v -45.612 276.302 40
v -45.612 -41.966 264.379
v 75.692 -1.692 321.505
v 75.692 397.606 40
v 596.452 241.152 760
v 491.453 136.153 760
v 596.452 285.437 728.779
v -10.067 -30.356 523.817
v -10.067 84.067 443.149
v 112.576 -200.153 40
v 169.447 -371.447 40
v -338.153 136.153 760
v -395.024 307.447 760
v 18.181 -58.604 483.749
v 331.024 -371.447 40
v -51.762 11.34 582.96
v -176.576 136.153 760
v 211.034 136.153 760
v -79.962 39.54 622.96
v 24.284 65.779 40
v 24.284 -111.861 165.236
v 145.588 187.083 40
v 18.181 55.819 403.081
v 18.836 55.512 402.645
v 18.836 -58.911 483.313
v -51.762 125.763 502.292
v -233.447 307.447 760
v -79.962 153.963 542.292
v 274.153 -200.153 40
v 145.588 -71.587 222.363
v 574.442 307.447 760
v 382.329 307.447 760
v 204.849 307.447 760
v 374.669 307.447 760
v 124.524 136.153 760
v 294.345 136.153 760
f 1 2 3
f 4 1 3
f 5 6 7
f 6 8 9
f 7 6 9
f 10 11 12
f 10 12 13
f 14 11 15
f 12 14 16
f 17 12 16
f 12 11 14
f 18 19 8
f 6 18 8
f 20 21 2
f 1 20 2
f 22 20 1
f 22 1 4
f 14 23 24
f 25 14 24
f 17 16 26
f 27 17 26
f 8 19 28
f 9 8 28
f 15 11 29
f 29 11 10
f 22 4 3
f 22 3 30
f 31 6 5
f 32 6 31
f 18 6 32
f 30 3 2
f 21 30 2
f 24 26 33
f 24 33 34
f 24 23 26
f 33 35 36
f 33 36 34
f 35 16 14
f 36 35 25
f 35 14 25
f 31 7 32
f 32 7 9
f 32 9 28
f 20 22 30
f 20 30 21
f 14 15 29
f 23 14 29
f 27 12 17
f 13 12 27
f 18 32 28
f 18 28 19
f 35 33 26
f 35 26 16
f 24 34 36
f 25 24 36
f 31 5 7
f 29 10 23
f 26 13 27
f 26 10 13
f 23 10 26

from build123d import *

# Parameters (mm, degrees)
F9_W           = 140
F9_H           = 140
F10_DEPTH      = 800
F10_DEPTH_BACK = 800
F12_W          = 564.5952224731
F12_H          = 285.0261449814
F13_DEPTH      = 1428.1339100058
F15_DEPTH      = 700
F16_W          = 560.895
F16_H          = 273.263
F17_DEPTH      = 1359.2254278392
F19_DEPTH      = 700
F21_DEPTH      = 1596.4534700886
F22_W          = 800
F22_H          = 96.37819767
F22_W_2        = 981.2902510166
F22_H_2        = 103.05424124
F23_DEPTH      = 1596.4534700886
F27_W          = 131.7142857143
F27_H          = 140
F28_DEPTH      = 25
F28_DEPTH_BACK = 50
F29_DEPTH      = 800
F31_DEPTH      = 1596.4534700886


with BuildPart() as f10:
    # F9 (on offset) → F10 (new body, two sides)
    with BuildSketch(Plane(origin=(-141.3425141685, 141.3425141685, 200.4858357), x_dir=(0.8664559823, 0.2876707367, 0.4080435981), z_dir=(-0.4992534734, 0.4992534734, 0.7081609552))) as f10_sk:
        with Locations((126.285384252, -256.6345486516)):
            Rectangle(F9_W, F9_H)
    extrude(amount=F10_DEPTH)
    extrude(f10_sk.sketch, amount=-F10_DEPTH_BACK)

    # F12 (on offset) → F13 (cut, through all)
    with BuildSketch(Plane.YZ.offset(-1000)):
        with Locations((282.2976112366, 942.5130724907)):
            Rectangle(F12_W, F12_H)
        Polygon((-127.9739290476, -303.6372065544), (-127.9739290476, 0), (-400, 0), (-567.8840875626, 0), (-567.8840875626, -303.6372065544), align=None)
    extrude(amount=F13_DEPTH, mode=Mode.SUBTRACT)


with BuildPart() as f15:
    # F14 (on face) → F15 (new body)
    with BuildSketch(Plane(origin=(0, -152.5378125987, 107.5391578821), x_dir=(-1, 0, 0), z_dir=(0, 0.8173074798, -0.5762017732))):
        Polygon((45.6116016434, 191.898172882), (-75.6922358782, 261.7936591636), (-145.5877221597, 140.4898216419), (-24.2838846381, 70.5943353604), align=None)
    extrude(amount=F15_DEPTH)

    # F16 (on offset) → F17 (cut, through all)
    with BuildSketch(Plane.YZ.offset(-1000)):
        with Locations((375.4791935778, -136.6315)):
            Rectangle(F16_W, F16_H)
    extrude(amount=F17_DEPTH, mode=Mode.SUBTRACT)


with BuildPart() as f19:
    # F18 (on face) → F19 (new body)
    with BuildSketch(Plane(origin=(170.0726454226, 56.4655610903, 80.0929944543), x_dir=(-0.2602551811, 0.9577293706, -0.1225630184), z_dir=(0.8664559823, 0.2876707367, 0.4080435981))):
        Polygon((101.8001949413, 524.6782716814), (-17.6730619993, 597.6586860129), (-90.6534763308, 478.1854290723), (28.8197806098, 405.2050147407), align=None)
    extrude(amount=F19_DEPTH)

    # F20 (on offset) → F21 (cut, through all)
    with BuildSketch(Plane.YZ.offset(-1000)):
        Polygon((400, 800), (468.4830904007, 800), (468.4830904007, 1033.912062645), (129.1458308697, 1033.912062645), (129.1458308697, 800), align=None)
    extrude(amount=F21_DEPTH, mode=Mode.SUBTRACT)


with BuildPart() as f23_tool:
    # F22 (on offset) → F23 (new body, through all)
    with BuildSketch(Plane.YZ.offset(-1000)):
        with Locations((0, 808.189098835)):
            Rectangle(F22_W, F22_H)
        with Locations((7.2197765112, -11.52712062)):
            Rectangle(F22_W_2, F22_H_2)
    extrude(amount=F23_DEPTH)


with BuildPart() as f10_1:
    add(f10.part)

    # F23: cut by f23_tool
    add(f23_tool.part, mode=Mode.SUBTRACT)

    # F27 (on 3pt) → F28 (join, two sides)
    with BuildSketch(Plane(origin=(215.8367219303, 152.8155457803, 216.7596394047), x_dir=(0.7756098225, -0.3637058454, -0.5158948161), z_dir=(-0.6312126451, -0.4469077551, -0.6339117093))) as f28_sk:
        with Locations((-279.1603104754, 256.6345486516)):
            Rectangle(F27_W, F27_H)
    extrude(amount=-F28_DEPTH)
    extrude(f28_sk.sketch, amount=F28_DEPTH_BACK)

    # F29 (add): a face of the model
    f29_faces = [f10_1.faces().sort_by_distance(p)[0] for p in [
        (15.0975592058, 55.77114019, 524.4980711915),
    ]]
    extrude(f29_faces, amount=F29_DEPTH)

    # F30 (on offset) → F31 (cut, through all)
    with BuildSketch(Plane.YZ.offset(-1000)):
        Polygon((380.0384484697, 1105.9369213675), (136.1529189055, 760), (307.4470810945, 760), (494.4614956391, 1025.268673113), align=None)
    extrude(amount=F31_DEPTH, mode=Mode.SUBTRACT)


with BuildPart() as f15_1:
    add(f15.part)

    # F23: cut by f23_tool
    add(f23_tool.part, mode=Mode.SUBTRACT)


with BuildPart() as f19_1:
    add(f19.part)

    # F23: cut by f23_tool
    add(f23_tool.part, mode=Mode.SUBTRACT)


solid = Compound([f10_1.part, f15_1.part, f19_1.part])
